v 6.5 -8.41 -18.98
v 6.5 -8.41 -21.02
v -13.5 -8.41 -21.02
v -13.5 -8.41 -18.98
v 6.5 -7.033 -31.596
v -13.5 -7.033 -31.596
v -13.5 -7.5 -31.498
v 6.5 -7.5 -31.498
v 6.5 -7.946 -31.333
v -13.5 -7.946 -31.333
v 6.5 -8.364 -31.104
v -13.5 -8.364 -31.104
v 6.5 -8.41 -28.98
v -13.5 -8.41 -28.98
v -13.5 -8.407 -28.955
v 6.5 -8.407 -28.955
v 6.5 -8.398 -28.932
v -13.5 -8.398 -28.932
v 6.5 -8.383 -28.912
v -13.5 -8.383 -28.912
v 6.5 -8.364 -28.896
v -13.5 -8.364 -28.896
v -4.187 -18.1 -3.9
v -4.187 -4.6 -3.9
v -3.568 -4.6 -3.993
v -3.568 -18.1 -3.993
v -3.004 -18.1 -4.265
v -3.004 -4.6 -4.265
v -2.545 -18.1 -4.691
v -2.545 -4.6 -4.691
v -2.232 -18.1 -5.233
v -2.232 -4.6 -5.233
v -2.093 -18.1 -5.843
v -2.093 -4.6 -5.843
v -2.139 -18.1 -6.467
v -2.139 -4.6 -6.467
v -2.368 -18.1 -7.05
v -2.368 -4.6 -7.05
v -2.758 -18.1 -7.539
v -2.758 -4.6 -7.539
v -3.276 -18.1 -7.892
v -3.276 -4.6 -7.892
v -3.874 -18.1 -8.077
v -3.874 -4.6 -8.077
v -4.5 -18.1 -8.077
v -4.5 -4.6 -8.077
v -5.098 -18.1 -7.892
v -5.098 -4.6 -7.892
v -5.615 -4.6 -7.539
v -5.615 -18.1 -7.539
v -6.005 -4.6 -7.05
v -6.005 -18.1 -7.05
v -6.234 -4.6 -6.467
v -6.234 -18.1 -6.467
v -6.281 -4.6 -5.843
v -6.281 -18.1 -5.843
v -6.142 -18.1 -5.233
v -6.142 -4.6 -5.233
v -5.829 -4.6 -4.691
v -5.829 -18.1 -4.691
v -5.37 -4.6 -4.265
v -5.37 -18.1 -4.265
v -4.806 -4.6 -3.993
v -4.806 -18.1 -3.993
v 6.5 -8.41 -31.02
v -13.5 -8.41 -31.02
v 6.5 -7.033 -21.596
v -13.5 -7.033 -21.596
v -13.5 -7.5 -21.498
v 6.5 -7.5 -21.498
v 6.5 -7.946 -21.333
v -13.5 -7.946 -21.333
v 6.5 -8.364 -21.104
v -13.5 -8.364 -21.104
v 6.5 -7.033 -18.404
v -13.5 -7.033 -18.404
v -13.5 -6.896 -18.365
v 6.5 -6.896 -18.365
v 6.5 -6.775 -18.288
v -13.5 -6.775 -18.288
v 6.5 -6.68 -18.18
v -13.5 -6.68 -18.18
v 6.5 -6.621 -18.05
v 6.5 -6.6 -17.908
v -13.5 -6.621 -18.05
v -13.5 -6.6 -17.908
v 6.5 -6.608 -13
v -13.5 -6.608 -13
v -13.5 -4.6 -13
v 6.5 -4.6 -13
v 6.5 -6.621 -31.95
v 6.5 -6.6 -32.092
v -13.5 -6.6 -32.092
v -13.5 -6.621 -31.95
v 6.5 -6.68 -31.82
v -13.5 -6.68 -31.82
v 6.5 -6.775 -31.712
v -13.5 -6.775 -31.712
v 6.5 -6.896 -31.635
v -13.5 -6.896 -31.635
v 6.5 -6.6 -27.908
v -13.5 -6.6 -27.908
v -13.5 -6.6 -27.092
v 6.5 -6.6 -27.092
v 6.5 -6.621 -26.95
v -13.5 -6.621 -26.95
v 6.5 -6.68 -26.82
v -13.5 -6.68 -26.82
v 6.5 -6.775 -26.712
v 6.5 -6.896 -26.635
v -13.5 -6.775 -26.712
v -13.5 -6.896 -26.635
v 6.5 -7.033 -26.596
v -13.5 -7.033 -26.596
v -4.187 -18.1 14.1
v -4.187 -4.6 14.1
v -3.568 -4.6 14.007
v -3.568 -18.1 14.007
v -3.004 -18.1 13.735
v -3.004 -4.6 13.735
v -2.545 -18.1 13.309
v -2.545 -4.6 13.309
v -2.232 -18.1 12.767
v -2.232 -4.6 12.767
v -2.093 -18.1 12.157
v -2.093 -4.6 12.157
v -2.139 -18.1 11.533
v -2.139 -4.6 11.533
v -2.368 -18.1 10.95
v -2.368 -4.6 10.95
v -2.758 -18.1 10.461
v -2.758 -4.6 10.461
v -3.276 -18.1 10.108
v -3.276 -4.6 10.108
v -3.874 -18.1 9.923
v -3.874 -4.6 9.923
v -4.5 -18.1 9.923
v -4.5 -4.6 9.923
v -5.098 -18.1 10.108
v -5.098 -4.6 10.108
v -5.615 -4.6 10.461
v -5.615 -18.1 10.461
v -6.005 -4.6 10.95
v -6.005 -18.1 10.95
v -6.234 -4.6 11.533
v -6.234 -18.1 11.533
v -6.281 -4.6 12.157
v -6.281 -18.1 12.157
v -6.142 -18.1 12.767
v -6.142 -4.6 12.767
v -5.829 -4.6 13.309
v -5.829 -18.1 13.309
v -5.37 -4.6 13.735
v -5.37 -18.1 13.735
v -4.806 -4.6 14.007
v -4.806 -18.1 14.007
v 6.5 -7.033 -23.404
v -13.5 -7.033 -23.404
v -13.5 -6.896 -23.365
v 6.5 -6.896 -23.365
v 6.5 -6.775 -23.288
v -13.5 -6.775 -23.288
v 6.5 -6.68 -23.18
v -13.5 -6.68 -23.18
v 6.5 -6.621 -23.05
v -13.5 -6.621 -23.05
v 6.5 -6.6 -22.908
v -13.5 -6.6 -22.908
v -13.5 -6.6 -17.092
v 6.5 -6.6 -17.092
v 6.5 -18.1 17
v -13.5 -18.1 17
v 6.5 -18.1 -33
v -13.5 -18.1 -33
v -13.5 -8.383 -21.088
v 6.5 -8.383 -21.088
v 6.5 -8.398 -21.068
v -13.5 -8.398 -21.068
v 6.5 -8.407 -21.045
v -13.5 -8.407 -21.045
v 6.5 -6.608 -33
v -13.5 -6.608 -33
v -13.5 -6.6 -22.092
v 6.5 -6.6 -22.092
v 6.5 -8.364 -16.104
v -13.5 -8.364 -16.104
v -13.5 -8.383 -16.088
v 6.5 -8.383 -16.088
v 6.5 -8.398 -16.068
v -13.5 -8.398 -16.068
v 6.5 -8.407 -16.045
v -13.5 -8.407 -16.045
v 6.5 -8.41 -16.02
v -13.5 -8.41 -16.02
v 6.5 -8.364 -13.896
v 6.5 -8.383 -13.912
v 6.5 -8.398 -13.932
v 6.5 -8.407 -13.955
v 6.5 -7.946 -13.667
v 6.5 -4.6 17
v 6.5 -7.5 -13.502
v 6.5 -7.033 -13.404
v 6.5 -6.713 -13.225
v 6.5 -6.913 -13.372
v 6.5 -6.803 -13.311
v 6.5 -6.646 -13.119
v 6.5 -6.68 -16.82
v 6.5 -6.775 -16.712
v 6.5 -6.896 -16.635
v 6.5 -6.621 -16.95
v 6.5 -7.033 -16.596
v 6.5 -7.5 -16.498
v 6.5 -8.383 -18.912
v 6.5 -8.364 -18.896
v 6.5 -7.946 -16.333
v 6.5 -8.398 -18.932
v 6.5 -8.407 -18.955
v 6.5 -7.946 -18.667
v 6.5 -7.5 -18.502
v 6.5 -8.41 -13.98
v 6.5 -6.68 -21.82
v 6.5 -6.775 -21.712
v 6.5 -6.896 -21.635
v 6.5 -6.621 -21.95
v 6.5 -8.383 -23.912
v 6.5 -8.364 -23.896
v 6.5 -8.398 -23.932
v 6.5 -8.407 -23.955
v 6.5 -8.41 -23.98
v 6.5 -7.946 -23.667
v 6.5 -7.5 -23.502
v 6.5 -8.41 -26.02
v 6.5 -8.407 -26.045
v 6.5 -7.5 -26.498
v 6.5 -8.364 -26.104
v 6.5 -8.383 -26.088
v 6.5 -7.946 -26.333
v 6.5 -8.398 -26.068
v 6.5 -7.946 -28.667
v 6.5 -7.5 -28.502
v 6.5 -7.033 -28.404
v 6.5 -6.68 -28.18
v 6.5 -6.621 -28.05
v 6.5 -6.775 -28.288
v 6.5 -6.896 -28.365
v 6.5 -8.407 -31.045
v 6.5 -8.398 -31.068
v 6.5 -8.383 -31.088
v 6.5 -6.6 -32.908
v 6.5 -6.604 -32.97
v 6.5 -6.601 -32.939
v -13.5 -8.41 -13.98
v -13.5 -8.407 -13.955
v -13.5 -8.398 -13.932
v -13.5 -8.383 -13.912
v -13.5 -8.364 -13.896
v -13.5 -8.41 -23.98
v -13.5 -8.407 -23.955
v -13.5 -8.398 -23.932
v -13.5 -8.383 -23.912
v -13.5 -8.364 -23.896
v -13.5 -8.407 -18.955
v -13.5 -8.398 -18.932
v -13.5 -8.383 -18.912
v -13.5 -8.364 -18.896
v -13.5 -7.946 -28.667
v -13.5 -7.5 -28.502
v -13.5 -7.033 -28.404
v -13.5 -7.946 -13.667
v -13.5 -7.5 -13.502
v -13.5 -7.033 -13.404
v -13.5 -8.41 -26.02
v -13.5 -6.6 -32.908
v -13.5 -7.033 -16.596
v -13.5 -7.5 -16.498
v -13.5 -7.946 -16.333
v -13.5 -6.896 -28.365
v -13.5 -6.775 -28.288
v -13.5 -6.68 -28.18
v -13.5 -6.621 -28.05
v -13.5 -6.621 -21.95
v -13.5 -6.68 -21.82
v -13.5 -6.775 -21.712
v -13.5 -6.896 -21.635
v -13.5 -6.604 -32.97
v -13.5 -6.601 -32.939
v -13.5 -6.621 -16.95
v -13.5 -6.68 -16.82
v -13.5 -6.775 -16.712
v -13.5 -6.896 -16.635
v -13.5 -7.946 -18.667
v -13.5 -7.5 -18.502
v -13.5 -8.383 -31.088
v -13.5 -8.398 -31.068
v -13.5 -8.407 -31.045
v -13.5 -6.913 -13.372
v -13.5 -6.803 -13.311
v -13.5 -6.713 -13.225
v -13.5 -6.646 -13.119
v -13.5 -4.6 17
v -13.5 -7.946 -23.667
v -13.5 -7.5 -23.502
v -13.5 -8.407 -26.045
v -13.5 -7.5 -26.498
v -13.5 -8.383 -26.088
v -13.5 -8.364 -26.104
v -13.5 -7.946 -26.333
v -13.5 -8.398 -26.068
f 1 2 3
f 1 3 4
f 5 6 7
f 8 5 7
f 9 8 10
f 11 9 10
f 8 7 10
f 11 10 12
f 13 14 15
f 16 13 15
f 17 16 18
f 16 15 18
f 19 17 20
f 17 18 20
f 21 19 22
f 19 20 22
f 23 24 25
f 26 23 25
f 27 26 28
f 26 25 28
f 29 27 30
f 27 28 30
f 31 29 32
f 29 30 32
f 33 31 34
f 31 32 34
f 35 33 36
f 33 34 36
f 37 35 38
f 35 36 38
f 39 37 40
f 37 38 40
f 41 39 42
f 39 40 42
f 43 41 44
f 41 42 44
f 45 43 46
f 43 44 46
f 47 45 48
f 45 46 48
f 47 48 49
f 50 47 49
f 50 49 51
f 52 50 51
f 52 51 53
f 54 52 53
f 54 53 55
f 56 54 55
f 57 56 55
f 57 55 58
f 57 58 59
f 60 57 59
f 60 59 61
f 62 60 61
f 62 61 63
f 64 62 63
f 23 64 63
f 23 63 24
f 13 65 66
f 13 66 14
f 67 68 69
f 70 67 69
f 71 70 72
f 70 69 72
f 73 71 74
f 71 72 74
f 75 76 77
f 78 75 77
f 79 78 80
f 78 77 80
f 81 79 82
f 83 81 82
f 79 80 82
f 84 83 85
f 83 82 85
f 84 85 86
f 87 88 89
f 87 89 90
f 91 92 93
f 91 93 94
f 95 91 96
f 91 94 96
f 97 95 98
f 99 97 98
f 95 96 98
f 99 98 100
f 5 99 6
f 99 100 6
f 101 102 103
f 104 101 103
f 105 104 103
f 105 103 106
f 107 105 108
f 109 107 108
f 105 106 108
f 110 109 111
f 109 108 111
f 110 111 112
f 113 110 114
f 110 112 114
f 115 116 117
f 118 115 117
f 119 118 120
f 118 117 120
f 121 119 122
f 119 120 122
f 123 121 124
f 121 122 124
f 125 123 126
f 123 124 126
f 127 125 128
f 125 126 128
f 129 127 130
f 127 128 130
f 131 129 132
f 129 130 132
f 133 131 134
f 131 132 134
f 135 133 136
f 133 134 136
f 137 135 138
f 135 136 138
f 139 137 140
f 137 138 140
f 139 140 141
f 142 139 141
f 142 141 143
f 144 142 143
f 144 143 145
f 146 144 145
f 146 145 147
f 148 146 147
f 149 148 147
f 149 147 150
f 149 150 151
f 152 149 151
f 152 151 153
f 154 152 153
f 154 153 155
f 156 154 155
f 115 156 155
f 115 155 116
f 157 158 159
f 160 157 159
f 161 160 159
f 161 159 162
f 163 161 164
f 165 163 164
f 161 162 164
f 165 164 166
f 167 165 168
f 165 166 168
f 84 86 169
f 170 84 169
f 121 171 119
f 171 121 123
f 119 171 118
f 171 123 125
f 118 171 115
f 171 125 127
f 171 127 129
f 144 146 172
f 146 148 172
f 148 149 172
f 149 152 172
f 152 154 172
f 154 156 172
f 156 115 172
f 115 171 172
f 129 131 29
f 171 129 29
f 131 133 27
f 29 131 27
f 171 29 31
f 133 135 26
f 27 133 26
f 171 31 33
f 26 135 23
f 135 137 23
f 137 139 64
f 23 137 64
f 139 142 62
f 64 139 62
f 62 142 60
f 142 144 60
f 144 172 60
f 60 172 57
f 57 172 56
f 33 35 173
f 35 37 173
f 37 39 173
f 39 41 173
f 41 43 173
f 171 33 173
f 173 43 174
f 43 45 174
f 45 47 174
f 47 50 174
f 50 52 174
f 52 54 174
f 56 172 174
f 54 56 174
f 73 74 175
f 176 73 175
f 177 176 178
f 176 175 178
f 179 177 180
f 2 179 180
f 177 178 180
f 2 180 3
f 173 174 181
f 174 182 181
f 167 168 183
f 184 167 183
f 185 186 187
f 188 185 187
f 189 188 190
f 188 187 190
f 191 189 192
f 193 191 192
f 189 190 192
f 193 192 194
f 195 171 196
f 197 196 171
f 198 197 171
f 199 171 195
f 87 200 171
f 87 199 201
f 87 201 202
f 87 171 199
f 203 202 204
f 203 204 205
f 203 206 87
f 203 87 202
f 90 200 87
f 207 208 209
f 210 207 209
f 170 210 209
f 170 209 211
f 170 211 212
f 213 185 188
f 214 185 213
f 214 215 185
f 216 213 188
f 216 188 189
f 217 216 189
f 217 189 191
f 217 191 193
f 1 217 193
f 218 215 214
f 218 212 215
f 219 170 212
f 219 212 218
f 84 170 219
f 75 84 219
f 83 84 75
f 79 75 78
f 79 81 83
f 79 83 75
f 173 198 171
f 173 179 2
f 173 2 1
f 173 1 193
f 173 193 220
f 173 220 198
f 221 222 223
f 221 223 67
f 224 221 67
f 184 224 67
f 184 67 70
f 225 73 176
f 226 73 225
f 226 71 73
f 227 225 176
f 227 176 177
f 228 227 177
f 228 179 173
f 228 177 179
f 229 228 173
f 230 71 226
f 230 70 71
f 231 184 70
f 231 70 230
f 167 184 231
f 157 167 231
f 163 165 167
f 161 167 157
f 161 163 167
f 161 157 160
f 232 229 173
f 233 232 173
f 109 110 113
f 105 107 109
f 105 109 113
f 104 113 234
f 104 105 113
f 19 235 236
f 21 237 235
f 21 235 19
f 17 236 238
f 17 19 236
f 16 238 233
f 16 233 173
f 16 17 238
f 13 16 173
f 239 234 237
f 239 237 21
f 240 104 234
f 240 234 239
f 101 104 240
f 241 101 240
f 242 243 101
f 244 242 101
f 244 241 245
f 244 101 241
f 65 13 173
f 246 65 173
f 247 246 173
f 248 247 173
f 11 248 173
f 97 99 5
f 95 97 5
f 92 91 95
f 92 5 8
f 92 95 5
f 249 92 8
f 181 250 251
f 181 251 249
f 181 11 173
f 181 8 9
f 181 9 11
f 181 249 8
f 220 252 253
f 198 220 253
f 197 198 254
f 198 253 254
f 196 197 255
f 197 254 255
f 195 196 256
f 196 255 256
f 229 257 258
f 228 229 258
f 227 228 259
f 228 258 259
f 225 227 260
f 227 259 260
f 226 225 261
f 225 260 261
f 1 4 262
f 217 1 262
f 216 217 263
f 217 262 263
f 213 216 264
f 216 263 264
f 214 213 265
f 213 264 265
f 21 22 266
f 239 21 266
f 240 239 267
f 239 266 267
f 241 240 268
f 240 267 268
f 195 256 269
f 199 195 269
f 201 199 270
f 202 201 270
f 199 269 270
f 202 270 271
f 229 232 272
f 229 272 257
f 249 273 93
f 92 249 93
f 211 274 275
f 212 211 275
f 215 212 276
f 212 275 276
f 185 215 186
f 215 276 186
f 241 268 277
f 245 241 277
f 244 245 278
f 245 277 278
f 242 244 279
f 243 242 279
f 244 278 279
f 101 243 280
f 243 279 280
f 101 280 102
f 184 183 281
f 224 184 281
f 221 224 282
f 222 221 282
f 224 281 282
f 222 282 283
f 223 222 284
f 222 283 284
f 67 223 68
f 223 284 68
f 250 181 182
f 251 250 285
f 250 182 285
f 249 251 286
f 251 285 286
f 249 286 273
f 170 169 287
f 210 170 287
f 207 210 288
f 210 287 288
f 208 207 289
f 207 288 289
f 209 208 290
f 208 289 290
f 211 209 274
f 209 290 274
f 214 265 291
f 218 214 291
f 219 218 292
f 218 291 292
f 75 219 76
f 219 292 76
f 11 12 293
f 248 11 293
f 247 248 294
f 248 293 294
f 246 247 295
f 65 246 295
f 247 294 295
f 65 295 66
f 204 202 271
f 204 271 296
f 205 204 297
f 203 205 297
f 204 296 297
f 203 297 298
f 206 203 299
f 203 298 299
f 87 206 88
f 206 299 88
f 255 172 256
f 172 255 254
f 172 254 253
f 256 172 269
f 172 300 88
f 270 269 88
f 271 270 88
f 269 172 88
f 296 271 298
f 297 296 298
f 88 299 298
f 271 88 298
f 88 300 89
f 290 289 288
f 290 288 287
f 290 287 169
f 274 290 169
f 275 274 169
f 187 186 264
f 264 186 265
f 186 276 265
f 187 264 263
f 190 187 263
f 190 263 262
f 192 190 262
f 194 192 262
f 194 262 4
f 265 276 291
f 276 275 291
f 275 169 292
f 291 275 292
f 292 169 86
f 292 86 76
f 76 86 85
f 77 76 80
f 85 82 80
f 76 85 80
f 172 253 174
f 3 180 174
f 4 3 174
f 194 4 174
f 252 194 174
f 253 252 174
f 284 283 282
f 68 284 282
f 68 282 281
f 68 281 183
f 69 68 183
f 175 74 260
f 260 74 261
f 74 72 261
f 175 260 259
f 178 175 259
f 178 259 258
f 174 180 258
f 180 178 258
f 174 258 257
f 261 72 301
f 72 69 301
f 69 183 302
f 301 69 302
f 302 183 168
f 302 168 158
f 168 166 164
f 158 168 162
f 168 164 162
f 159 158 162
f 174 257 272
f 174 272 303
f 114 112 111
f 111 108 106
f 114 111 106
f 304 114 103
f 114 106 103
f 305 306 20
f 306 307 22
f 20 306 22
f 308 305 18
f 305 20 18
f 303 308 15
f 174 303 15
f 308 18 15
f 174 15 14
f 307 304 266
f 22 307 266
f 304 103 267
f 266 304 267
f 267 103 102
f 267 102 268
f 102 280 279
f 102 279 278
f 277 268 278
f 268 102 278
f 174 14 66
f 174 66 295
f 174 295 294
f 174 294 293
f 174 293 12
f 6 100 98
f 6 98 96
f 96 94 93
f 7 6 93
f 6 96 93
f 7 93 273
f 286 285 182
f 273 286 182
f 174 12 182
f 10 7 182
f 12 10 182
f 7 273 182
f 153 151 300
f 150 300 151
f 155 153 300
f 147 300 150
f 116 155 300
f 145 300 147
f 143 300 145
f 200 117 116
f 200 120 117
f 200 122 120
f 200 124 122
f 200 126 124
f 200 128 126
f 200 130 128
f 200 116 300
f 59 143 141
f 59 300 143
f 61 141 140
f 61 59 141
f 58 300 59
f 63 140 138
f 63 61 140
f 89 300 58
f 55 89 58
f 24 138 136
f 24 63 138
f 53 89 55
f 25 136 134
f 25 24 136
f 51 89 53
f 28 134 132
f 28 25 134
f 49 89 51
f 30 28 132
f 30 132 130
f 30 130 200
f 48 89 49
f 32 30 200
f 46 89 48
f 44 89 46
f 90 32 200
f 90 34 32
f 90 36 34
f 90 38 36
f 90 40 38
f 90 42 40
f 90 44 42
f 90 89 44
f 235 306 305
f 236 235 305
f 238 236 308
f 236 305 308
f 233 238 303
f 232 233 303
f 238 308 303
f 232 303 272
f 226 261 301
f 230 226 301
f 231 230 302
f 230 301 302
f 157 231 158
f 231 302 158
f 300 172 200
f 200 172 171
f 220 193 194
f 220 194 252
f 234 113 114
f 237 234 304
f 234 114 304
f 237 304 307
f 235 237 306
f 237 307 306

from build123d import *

# Parameters (mm, degrees)
DELETE_START           = -13.5
DELETE_FACE_1_DEPTH    = 27
MOVE_FACE_1_BY         = 7
MOVE_FACE_2_BY         = 5.5
SKETCH_2_W             = 48.263019836
SKETCH_2_H             = 43.058184364
CUT_EXTRUDE_1_DEPTH    = 20
EXTRUDE_1_DEPTH        = 2
EXTRUDE_1_DEPTH_BACK   = 5
SKETCH_3_W             = 20
SKETCH_3_H             = 30
HOLE_WIZARD_M5_1_D     = 4.2
HOLE_WIZARD_M5_1_DEPTH = 20
HOLE_WIZARD_M5_1_TIP   = 1.2618073


with BuildPart() as part:
    # Delete Face 1: read off the stored shape, not the designer's step
    # Delete Face 1 outline → Delete Face 1 (new body)
    with BuildSketch(Plane.YZ.offset(DELETE_START)):
        with BuildLine():
            ThreePointArc((-8.364285714, 23.895568572), (-8.397831007, 23.931741933), (-8.41, 23.979551078))
            Line((-8.41, 23.979551078), (-8.41, 26.020448922))
            ThreePointArc((-8.41, 26.020448922), (-8.397831007, 26.068258067), (-8.364285714, 26.104431428))
            ThreePointArc((-8.364285714, 26.104431428), (-7.725958169, 26.423724028), (-7.033327746, 26.595982314))
            ThreePointArc((-7.033327746, 26.595982314), (-6.723611818, 26.762379014), (-6.6, 27.091517187))
            Line((-6.6, 27.091517187), (-6.6, 27.908482813))
            ThreePointArc((-6.6, 27.908482813), (-6.723615527, 28.237625227), (-7.033338915, 28.404019189))
            ThreePointArc((-7.033338915, 28.404019189), (-7.725963455, 28.576277924), (-8.364285714, 28.895568572))
            ThreePointArc((-8.364285714, 28.895568572), (-8.397831007, 28.931741933), (-8.41, 28.979551078))
            Line((-8.41, 28.979551078), (-8.41, 31.020448922))
            ThreePointArc((-8.41, 31.020448922), (-8.397831007, 31.068258067), (-8.364285714, 31.104431428))
            ThreePointArc((-8.364285714, 31.104431428), (-7.725958168, 31.423724029), (-7.033327744, 31.595982314))
            ThreePointArc((-7.033327744, 31.595982314), (-6.723611817, 31.762379015), (-6.6, 32.091517187))
            Line((-6.6, 32.091517187), (-6.6, 32.908482813))
            ThreePointArc((-6.6, 32.908482813), (-6.602116164, 32.954435895), (-6.608446743, 33))
            Line((-6.608446743, 33), (-12.6, 33))
            Line((-12.6, 33), (-12.6, -33))
            Line((-12.6, -33), (-6.608446743, -33))
            ThreePointArc((-6.608446743, -33), (-6.602116164, -32.954435895), (-6.6, -32.908482813))
            Line((-6.6, -32.908482813), (-6.6, -32.091517187))
            ThreePointArc((-6.6, -32.091517187), (-6.723615531, -31.762374768), (-7.033338927, -31.595980809))
            ThreePointArc((-7.033338927, -31.595980809), (-7.72596346, -31.423722074), (-8.364285714, -31.104431428))
            ThreePointArc((-8.364285714, -31.104431428), (-8.397831007, -31.068258067), (-8.41, -31.020448922))
            Line((-8.41, -31.020448922), (-8.41, -28.979551078))
            ThreePointArc((-8.41, -28.979551078), (-8.397831007, -28.931741933), (-8.364285714, -28.895568572))
            ThreePointArc((-8.364285714, -28.895568572), (-7.725958168, -28.576275971), (-7.033327744, -28.404017686))
            ThreePointArc((-7.033327744, -28.404017686), (-6.723611817, -28.237620985), (-6.6, -27.908482813))
            Line((-6.6, -27.908482813), (-6.6, -27.091517187))
            ThreePointArc((-6.6, -27.091517187), (-6.723615528, -26.762374772), (-7.033338917, -26.595980811))
            ThreePointArc((-7.033338917, -26.595980811), (-7.725963456, -26.423722076), (-8.364285714, -26.104431428))
            ThreePointArc((-8.364285714, -26.104431428), (-8.397831007, -26.068258067), (-8.41, -26.020448922))
            Line((-8.41, -26.020448922), (-8.41, -23.979551078))
            ThreePointArc((-8.41, -23.979551078), (-8.397831007, -23.931741933), (-8.364285714, -23.895568572))
            ThreePointArc((-8.364285714, -23.895568572), (-7.725958169, -23.576275972), (-7.033327746, -23.404017686))
            ThreePointArc((-7.033327746, -23.404017686), (-6.723611818, -23.237620986), (-6.6, -22.908482813))
            Line((-6.6, -22.908482813), (-6.6, -22.091517187))
            ThreePointArc((-6.6, -22.091517187), (-6.723615529, -21.76237477), (-7.033338921, -21.59598081))
            ThreePointArc((-7.033338921, -21.59598081), (-7.725963458, -21.423722075), (-8.364285714, -21.104431428))
            ThreePointArc((-8.364285714, -21.104431428), (-8.397831007, -21.068258067), (-8.41, -21.020448922))
            Line((-8.41, -21.020448922), (-8.41, -18.979551078))
            ThreePointArc((-8.41, -18.979551078), (-8.397831007, -18.931741933), (-8.364285714, -18.895568572))
            ThreePointArc((-8.364285714, -18.895568572), (-7.725958168, -18.576275971), (-7.033327744, -18.404017686))
            ThreePointArc((-7.033327744, -18.404017686), (-6.723611817, -18.237620985), (-6.6, -17.908482813))
            Line((-6.6, -17.908482813), (-6.6, -17.091517187))
            ThreePointArc((-6.6, -17.091517187), (-6.723615531, -16.762374768), (-7.033338926, -16.595980809))
            ThreePointArc((-7.033338926, -16.595980809), (-7.72596346, -16.423722074), (-8.364285714, -16.104431428))
            ThreePointArc((-8.364285714, -16.104431428), (-8.397831007, -16.068258067), (-8.41, -16.020448922))
            Line((-8.41, -16.020448922), (-8.41, -13.979551078))
            ThreePointArc((-8.41, -13.979551078), (-8.397831007, -13.931741933), (-8.364285714, -13.895568572))
            ThreePointArc((-8.364285714, -13.895568572), (-7.725958337, -13.576276034), (-7.033328102, -13.404017734))
            ThreePointArc((-7.033328102, -13.404017734), (-6.723611936, -13.237621121), (-6.6, -12.908482813))
            Line((-6.6, -12.908482813), (-6.6, -12.091517187))
            ThreePointArc((-6.6, -12.091517187), (-6.723615532, -11.762374767), (-7.033338929, -11.595980809))
            ThreePointArc((-7.033338929, -11.595980809), (-7.725963462, -11.423722074), (-8.364285714, -11.104431428))
            ThreePointArc((-8.364285714, -11.104431428), (-8.397831007, -11.068258067), (-8.41, -11.020448922))
            Line((-8.41, -11.020448922), (-8.41, -8.979551078))
            ThreePointArc((-8.41, -8.979551078), (-8.397831007, -8.931741933), (-8.364285714, -8.895568572))
            ThreePointArc((-8.364285714, -8.895568572), (-7.725958524, -8.576276103), (-7.033328496, -8.404017787))
            ThreePointArc((-7.033328496, -8.404017787), (-6.723612067, -8.23762127), (-6.6, -7.908482813))
            Line((-6.6, -7.908482813), (-6.6, -7.091517187))
            ThreePointArc((-6.6, -7.091517187), (-6.723615306, -6.762375026), (-7.033338249, -6.595980901))
            ThreePointArc((-7.033338249, -6.595980901), (-7.72596314, -6.423722193), (-8.364285714, -6.104431428))
            ThreePointArc((-8.364285714, -6.104431428), (-8.397831007, -6.068258067), (-8.41, -6.020448922))
            Line((-8.41, -6.020448922), (-8.41, -3.979551078))
            ThreePointArc((-8.41, -3.979551078), (-8.397831007, -3.931741933), (-8.364285714, -3.895568572))
            ThreePointArc((-8.364285714, -3.895568572), (-7.725958462, -3.57627608), (-7.033328366, -3.40401777))
            ThreePointArc((-7.033328366, -3.40401777), (-6.723612024, -3.237621221), (-6.6, -2.908482813))
            Line((-6.6, -2.908482813), (-6.6, -2.091517187))
            ThreePointArc((-6.6, -2.091517187), (-6.723615307, -1.762375024), (-7.033338252, -1.5959809))
            ThreePointArc((-7.033338252, -1.5959809), (-7.725963141, -1.423722192), (-8.364285714, -1.104431428))
            ThreePointArc((-8.364285714, -1.104431428), (-8.397831007, -1.068258067), (-8.41, -1.020448922))
            Line((-8.41, -1.020448922), (-8.41, 1.020448922))
            ThreePointArc((-8.41, 1.020448922), (-8.397831007, 1.068258067), (-8.364285714, 1.104431428))
            ThreePointArc((-8.364285714, 1.104431428), (-7.725958462, 1.42372392), (-7.033328366, 1.59598223))
            ThreePointArc((-7.033328366, 1.59598223), (-6.723612024, 1.762378779), (-6.6, 2.091517187))
            Line((-6.6, 2.091517187), (-6.6, 2.908482813))
            ThreePointArc((-6.6, 2.908482813), (-6.723615307, 3.237624975), (-7.033338252, 3.4040191))
            ThreePointArc((-7.033338252, 3.4040191), (-7.725963141, 3.576277808), (-8.364285714, 3.895568572))
            ThreePointArc((-8.364285714, 3.895568572), (-8.397831007, 3.931741933), (-8.41, 3.979551078))
            Line((-8.41, 3.979551078), (-8.41, 6.020448922))
            ThreePointArc((-8.41, 6.020448922), (-8.397831007, 6.068258067), (-8.364285714, 6.104431428))
            ThreePointArc((-8.364285714, 6.104431428), (-7.725958469, 6.423723918), (-7.03332838, 6.595982228))
            ThreePointArc((-7.03332838, 6.595982228), (-6.723612029, 6.762378774), (-6.6, 7.091517187))
            Line((-6.6, 7.091517187), (-6.6, 7.908482813))
            ThreePointArc((-6.6, 7.908482813), (-6.723615311, 8.23762498), (-7.033338263, 8.404019101))
            ThreePointArc((-7.033338263, 8.404019101), (-7.725963146, 8.57627781), (-8.364285714, 8.895568572))
            ThreePointArc((-8.364285714, 8.895568572), (-8.397831007, 8.931741933), (-8.41, 8.979551078))
            Line((-8.41, 8.979551078), (-8.41, 11.020448922))
            ThreePointArc((-8.41, 11.020448922), (-8.397831007, 11.068258067), (-8.364285714, 11.104431428))
            ThreePointArc((-8.364285714, 11.104431428), (-7.725958337, 11.423723966), (-7.033328101, 11.595982266))
            ThreePointArc((-7.033328101, 11.595982266), (-6.723611936, 11.76237888), (-6.6, 12.091517187))
            Line((-6.6, 12.091517187), (-6.6, 12.908482813))
            ThreePointArc((-6.6, 12.908482813), (-6.72361553, 13.237625231), (-7.033338924, 13.40401919))
            ThreePointArc((-7.033338924, 13.40401919), (-7.725963459, 13.576277925), (-8.364285714, 13.895568572))
            ThreePointArc((-8.364285714, 13.895568572), (-8.397831007, 13.931741933), (-8.41, 13.979551078))
            Line((-8.41, 13.979551078), (-8.41, 16.020448922))
            ThreePointArc((-8.41, 16.020448922), (-8.397831007, 16.068258067), (-8.364285714, 16.104431428))
            ThreePointArc((-8.364285714, 16.104431428), (-7.725958169, 16.423724029), (-7.033327745, 16.595982314))
            ThreePointArc((-7.033327745, 16.595982314), (-6.723611818, 16.762379015), (-6.6, 17.091517187))
            Line((-6.6, 17.091517187), (-6.6, 17.908482813))
            ThreePointArc((-6.6, 17.908482813), (-6.72361553, 18.23762523), (-7.033338923, 18.40401919))
            ThreePointArc((-7.033338923, 18.40401919), (-7.725963459, 18.576277925), (-8.364285714, 18.895568572))
            ThreePointArc((-8.364285714, 18.895568572), (-8.397831007, 18.931741933), (-8.41, 18.979551078))
            Line((-8.41, 18.979551078), (-8.41, 21.020448922))
            ThreePointArc((-8.41, 21.020448922), (-8.397831007, 21.068258067), (-8.364285714, 21.104431428))
            ThreePointArc((-8.364285714, 21.104431428), (-7.725958168, 21.423724029), (-7.033327744, 21.595982314))
            ThreePointArc((-7.033327744, 21.595982314), (-6.723611817, 21.762379015), (-6.6, 22.091517187))
            Line((-6.6, 22.091517187), (-6.6, 22.908482813))
            ThreePointArc((-6.6, 22.908482813), (-6.723615528, 23.237625227), (-7.033338915, 23.404019189))
            ThreePointArc((-7.033338915, 23.404019189), (-7.725963455, 23.576277924), (-8.364285714, 23.895568572))
        make_face()
    extrude(amount=DELETE_FACE_1_DEPTH)

    # Move Face 1: a face moved inward by 7.0
    extrude(part.faces().sort_by_distance((13.5, -10.05864991, 0))[0], amount=MOVE_FACE_1_BY, dir=(-1, 0, 0), mode=Mode.SUBTRACT)

    # Move Face 2: a face moved outward by 5.5
    extrude(part.faces().sort_by_distance((-3.5, -12.6, 0))[0], amount=MOVE_FACE_2_BY, dir=(0, -1, 0))

    # 草图2 → 切除-拉伸1 (cut)
    with BuildSketch(Plane.XZ.offset(18.1)):
        with Locations((-0.503276546, 38.529092182)):
            Rectangle(SKETCH_2_W, SKETCH_2_H)
    extrude(amount=-CUT_EXTRUDE_1_DEPTH, mode=Mode.SUBTRACT)

    # 草图3 → 凸台-拉伸1 (add, two sides: drawn at the far end of the back side and taken through both)
    with BuildSketch(Plane(origin=(0, -6.6, 0), x_dir=(1, 0, 0), z_dir=(0, 1, 0)).offset(-EXTRUDE_1_DEPTH_BACK)):
        with Locations((-3.5, -2)):
            Rectangle(SKETCH_3_W, SKETCH_3_H)
    extrude(amount=EXTRUDE_1_DEPTH + EXTRUDE_1_DEPTH_BACK)

    # M5 螺纹孔1
    with Locations(Plane(origin=(-4.186814404, -18.1, 12), x_dir=(0, 0, -1), z_dir=(0, -1, 0))):
        with Locations((0, 0), (18, 0)):
            Hole(HOLE_WIZARD_M5_1_D / 2, depth=HOLE_WIZARD_M5_1_DEPTH)
            with Locations((0, 0, -(HOLE_WIZARD_M5_1_DEPTH + HOLE_WIZARD_M5_1_TIP / 2))):  # 118° drill point
                Cone(0, HOLE_WIZARD_M5_1_D / 2, HOLE_WIZARD_M5_1_TIP, mode=Mode.SUBTRACT)


solid = part.part
